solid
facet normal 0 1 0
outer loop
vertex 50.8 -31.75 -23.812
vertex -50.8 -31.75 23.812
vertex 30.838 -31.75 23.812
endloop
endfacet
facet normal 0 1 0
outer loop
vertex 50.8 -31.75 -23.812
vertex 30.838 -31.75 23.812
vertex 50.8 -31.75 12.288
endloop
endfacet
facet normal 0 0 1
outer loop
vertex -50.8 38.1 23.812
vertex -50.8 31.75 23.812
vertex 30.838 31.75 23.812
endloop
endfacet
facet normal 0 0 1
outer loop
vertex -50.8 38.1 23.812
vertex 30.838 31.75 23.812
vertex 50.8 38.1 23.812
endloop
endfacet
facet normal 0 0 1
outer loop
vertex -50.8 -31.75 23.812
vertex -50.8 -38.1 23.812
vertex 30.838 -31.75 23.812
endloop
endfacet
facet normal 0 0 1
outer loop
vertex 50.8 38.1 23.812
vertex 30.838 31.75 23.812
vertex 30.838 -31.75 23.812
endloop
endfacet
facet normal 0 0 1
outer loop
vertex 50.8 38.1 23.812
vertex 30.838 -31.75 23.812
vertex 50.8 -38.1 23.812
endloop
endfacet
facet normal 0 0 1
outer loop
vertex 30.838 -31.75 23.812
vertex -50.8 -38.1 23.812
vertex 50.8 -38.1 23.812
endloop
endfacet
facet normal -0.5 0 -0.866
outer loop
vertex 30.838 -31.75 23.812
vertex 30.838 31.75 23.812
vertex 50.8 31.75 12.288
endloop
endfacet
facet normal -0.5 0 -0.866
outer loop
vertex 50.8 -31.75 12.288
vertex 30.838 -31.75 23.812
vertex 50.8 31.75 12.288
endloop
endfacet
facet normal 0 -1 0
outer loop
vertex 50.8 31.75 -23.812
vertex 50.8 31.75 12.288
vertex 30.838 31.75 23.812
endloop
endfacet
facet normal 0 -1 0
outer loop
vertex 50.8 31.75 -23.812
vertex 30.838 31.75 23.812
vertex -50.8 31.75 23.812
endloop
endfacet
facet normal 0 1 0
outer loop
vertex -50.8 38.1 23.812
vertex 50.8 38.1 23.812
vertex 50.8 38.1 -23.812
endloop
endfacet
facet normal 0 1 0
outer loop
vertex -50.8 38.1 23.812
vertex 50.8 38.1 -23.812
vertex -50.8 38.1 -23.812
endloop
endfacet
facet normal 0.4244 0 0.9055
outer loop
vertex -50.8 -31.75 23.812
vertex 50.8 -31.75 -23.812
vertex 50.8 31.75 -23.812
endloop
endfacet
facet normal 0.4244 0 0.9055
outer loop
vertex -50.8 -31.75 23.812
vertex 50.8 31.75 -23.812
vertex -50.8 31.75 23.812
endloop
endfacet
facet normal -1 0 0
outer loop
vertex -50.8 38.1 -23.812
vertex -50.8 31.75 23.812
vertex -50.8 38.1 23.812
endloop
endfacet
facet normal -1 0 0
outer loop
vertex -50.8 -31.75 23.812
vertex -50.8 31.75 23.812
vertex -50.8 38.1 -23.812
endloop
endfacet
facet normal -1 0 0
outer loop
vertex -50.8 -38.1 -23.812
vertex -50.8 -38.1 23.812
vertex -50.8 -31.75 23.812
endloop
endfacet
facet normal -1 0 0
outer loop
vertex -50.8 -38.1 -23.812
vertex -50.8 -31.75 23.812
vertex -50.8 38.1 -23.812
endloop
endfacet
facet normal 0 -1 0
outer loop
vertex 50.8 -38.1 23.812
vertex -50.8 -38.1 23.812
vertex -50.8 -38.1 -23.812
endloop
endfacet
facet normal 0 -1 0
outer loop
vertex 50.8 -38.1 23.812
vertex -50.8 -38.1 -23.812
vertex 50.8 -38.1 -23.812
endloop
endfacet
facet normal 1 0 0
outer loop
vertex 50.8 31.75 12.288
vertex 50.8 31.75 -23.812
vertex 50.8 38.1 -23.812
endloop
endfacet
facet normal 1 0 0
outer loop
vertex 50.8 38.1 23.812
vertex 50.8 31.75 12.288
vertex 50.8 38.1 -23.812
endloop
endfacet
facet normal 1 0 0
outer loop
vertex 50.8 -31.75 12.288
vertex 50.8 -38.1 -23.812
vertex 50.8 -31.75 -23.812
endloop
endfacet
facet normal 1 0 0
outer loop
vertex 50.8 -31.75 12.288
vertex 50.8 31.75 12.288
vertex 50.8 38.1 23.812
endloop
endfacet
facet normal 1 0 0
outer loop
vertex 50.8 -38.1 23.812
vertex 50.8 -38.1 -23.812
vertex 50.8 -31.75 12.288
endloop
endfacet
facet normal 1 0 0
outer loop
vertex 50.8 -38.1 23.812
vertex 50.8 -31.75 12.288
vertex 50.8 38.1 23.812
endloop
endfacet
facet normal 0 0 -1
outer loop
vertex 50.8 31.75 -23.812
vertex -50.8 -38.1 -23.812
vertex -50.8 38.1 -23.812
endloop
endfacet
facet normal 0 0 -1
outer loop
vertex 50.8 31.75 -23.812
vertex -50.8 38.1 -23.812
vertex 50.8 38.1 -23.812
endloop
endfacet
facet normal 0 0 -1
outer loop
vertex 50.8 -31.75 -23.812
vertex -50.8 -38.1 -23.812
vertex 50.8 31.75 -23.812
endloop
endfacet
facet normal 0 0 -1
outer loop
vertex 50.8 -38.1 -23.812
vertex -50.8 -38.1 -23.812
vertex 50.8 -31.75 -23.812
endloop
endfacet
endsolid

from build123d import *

# Parameters (mm, degrees)
F1_DEPTH = 38.1
F2_W     = 101.6
F2_H     = 47.625
F3_DEPTH = 6.35
F4_W     = 101.6
F4_H     = 47.625
F5_DEPTH = 6.35


# Not quite as in the source:
# - a feature names something its author has since deleted; it is built from what else it names


with BuildPart() as f1:
    # F0 (on Front) → F1 (new body, symmetric)
    with BuildSketch(Plane.XZ):
        Polygon((50.8, 12.2875440849), (50.8, 23.8125), (30.8381908, 23.8125), align=None)
    extrude(amount=F1_DEPTH, both=True)



with BuildPart() as f1b:
    # F0 (on Front) → F1, piece 2 (new body, symmetric)
    with BuildSketch(Plane.XZ):
        Polygon((50.8, -23.8125), (-50.8, 23.8125), (-50.8, -23.8125), align=None)
    extrude(amount=F1_DEPTH, both=True)


with BuildPart() as f1_1:
    add(f1.part)

    add(f1b.part)  # F3 merges F1b
    # F2 (on face) → F3 (join)
    with BuildSketch(Plane(origin=(0, 38.1, 0), x_dir=(-1, 0, 0), z_dir=(0, 1, 0))):
        Rectangle(F2_W, F2_H)
    extrude(amount=-F3_DEPTH)

    # F4 (on face) → F5 (join)
    with BuildSketch(Plane.XZ.offset(38.1)):
        Rectangle(F4_W, F4_H)
    extrude(amount=-F5_DEPTH)


solid = f1_1.part
